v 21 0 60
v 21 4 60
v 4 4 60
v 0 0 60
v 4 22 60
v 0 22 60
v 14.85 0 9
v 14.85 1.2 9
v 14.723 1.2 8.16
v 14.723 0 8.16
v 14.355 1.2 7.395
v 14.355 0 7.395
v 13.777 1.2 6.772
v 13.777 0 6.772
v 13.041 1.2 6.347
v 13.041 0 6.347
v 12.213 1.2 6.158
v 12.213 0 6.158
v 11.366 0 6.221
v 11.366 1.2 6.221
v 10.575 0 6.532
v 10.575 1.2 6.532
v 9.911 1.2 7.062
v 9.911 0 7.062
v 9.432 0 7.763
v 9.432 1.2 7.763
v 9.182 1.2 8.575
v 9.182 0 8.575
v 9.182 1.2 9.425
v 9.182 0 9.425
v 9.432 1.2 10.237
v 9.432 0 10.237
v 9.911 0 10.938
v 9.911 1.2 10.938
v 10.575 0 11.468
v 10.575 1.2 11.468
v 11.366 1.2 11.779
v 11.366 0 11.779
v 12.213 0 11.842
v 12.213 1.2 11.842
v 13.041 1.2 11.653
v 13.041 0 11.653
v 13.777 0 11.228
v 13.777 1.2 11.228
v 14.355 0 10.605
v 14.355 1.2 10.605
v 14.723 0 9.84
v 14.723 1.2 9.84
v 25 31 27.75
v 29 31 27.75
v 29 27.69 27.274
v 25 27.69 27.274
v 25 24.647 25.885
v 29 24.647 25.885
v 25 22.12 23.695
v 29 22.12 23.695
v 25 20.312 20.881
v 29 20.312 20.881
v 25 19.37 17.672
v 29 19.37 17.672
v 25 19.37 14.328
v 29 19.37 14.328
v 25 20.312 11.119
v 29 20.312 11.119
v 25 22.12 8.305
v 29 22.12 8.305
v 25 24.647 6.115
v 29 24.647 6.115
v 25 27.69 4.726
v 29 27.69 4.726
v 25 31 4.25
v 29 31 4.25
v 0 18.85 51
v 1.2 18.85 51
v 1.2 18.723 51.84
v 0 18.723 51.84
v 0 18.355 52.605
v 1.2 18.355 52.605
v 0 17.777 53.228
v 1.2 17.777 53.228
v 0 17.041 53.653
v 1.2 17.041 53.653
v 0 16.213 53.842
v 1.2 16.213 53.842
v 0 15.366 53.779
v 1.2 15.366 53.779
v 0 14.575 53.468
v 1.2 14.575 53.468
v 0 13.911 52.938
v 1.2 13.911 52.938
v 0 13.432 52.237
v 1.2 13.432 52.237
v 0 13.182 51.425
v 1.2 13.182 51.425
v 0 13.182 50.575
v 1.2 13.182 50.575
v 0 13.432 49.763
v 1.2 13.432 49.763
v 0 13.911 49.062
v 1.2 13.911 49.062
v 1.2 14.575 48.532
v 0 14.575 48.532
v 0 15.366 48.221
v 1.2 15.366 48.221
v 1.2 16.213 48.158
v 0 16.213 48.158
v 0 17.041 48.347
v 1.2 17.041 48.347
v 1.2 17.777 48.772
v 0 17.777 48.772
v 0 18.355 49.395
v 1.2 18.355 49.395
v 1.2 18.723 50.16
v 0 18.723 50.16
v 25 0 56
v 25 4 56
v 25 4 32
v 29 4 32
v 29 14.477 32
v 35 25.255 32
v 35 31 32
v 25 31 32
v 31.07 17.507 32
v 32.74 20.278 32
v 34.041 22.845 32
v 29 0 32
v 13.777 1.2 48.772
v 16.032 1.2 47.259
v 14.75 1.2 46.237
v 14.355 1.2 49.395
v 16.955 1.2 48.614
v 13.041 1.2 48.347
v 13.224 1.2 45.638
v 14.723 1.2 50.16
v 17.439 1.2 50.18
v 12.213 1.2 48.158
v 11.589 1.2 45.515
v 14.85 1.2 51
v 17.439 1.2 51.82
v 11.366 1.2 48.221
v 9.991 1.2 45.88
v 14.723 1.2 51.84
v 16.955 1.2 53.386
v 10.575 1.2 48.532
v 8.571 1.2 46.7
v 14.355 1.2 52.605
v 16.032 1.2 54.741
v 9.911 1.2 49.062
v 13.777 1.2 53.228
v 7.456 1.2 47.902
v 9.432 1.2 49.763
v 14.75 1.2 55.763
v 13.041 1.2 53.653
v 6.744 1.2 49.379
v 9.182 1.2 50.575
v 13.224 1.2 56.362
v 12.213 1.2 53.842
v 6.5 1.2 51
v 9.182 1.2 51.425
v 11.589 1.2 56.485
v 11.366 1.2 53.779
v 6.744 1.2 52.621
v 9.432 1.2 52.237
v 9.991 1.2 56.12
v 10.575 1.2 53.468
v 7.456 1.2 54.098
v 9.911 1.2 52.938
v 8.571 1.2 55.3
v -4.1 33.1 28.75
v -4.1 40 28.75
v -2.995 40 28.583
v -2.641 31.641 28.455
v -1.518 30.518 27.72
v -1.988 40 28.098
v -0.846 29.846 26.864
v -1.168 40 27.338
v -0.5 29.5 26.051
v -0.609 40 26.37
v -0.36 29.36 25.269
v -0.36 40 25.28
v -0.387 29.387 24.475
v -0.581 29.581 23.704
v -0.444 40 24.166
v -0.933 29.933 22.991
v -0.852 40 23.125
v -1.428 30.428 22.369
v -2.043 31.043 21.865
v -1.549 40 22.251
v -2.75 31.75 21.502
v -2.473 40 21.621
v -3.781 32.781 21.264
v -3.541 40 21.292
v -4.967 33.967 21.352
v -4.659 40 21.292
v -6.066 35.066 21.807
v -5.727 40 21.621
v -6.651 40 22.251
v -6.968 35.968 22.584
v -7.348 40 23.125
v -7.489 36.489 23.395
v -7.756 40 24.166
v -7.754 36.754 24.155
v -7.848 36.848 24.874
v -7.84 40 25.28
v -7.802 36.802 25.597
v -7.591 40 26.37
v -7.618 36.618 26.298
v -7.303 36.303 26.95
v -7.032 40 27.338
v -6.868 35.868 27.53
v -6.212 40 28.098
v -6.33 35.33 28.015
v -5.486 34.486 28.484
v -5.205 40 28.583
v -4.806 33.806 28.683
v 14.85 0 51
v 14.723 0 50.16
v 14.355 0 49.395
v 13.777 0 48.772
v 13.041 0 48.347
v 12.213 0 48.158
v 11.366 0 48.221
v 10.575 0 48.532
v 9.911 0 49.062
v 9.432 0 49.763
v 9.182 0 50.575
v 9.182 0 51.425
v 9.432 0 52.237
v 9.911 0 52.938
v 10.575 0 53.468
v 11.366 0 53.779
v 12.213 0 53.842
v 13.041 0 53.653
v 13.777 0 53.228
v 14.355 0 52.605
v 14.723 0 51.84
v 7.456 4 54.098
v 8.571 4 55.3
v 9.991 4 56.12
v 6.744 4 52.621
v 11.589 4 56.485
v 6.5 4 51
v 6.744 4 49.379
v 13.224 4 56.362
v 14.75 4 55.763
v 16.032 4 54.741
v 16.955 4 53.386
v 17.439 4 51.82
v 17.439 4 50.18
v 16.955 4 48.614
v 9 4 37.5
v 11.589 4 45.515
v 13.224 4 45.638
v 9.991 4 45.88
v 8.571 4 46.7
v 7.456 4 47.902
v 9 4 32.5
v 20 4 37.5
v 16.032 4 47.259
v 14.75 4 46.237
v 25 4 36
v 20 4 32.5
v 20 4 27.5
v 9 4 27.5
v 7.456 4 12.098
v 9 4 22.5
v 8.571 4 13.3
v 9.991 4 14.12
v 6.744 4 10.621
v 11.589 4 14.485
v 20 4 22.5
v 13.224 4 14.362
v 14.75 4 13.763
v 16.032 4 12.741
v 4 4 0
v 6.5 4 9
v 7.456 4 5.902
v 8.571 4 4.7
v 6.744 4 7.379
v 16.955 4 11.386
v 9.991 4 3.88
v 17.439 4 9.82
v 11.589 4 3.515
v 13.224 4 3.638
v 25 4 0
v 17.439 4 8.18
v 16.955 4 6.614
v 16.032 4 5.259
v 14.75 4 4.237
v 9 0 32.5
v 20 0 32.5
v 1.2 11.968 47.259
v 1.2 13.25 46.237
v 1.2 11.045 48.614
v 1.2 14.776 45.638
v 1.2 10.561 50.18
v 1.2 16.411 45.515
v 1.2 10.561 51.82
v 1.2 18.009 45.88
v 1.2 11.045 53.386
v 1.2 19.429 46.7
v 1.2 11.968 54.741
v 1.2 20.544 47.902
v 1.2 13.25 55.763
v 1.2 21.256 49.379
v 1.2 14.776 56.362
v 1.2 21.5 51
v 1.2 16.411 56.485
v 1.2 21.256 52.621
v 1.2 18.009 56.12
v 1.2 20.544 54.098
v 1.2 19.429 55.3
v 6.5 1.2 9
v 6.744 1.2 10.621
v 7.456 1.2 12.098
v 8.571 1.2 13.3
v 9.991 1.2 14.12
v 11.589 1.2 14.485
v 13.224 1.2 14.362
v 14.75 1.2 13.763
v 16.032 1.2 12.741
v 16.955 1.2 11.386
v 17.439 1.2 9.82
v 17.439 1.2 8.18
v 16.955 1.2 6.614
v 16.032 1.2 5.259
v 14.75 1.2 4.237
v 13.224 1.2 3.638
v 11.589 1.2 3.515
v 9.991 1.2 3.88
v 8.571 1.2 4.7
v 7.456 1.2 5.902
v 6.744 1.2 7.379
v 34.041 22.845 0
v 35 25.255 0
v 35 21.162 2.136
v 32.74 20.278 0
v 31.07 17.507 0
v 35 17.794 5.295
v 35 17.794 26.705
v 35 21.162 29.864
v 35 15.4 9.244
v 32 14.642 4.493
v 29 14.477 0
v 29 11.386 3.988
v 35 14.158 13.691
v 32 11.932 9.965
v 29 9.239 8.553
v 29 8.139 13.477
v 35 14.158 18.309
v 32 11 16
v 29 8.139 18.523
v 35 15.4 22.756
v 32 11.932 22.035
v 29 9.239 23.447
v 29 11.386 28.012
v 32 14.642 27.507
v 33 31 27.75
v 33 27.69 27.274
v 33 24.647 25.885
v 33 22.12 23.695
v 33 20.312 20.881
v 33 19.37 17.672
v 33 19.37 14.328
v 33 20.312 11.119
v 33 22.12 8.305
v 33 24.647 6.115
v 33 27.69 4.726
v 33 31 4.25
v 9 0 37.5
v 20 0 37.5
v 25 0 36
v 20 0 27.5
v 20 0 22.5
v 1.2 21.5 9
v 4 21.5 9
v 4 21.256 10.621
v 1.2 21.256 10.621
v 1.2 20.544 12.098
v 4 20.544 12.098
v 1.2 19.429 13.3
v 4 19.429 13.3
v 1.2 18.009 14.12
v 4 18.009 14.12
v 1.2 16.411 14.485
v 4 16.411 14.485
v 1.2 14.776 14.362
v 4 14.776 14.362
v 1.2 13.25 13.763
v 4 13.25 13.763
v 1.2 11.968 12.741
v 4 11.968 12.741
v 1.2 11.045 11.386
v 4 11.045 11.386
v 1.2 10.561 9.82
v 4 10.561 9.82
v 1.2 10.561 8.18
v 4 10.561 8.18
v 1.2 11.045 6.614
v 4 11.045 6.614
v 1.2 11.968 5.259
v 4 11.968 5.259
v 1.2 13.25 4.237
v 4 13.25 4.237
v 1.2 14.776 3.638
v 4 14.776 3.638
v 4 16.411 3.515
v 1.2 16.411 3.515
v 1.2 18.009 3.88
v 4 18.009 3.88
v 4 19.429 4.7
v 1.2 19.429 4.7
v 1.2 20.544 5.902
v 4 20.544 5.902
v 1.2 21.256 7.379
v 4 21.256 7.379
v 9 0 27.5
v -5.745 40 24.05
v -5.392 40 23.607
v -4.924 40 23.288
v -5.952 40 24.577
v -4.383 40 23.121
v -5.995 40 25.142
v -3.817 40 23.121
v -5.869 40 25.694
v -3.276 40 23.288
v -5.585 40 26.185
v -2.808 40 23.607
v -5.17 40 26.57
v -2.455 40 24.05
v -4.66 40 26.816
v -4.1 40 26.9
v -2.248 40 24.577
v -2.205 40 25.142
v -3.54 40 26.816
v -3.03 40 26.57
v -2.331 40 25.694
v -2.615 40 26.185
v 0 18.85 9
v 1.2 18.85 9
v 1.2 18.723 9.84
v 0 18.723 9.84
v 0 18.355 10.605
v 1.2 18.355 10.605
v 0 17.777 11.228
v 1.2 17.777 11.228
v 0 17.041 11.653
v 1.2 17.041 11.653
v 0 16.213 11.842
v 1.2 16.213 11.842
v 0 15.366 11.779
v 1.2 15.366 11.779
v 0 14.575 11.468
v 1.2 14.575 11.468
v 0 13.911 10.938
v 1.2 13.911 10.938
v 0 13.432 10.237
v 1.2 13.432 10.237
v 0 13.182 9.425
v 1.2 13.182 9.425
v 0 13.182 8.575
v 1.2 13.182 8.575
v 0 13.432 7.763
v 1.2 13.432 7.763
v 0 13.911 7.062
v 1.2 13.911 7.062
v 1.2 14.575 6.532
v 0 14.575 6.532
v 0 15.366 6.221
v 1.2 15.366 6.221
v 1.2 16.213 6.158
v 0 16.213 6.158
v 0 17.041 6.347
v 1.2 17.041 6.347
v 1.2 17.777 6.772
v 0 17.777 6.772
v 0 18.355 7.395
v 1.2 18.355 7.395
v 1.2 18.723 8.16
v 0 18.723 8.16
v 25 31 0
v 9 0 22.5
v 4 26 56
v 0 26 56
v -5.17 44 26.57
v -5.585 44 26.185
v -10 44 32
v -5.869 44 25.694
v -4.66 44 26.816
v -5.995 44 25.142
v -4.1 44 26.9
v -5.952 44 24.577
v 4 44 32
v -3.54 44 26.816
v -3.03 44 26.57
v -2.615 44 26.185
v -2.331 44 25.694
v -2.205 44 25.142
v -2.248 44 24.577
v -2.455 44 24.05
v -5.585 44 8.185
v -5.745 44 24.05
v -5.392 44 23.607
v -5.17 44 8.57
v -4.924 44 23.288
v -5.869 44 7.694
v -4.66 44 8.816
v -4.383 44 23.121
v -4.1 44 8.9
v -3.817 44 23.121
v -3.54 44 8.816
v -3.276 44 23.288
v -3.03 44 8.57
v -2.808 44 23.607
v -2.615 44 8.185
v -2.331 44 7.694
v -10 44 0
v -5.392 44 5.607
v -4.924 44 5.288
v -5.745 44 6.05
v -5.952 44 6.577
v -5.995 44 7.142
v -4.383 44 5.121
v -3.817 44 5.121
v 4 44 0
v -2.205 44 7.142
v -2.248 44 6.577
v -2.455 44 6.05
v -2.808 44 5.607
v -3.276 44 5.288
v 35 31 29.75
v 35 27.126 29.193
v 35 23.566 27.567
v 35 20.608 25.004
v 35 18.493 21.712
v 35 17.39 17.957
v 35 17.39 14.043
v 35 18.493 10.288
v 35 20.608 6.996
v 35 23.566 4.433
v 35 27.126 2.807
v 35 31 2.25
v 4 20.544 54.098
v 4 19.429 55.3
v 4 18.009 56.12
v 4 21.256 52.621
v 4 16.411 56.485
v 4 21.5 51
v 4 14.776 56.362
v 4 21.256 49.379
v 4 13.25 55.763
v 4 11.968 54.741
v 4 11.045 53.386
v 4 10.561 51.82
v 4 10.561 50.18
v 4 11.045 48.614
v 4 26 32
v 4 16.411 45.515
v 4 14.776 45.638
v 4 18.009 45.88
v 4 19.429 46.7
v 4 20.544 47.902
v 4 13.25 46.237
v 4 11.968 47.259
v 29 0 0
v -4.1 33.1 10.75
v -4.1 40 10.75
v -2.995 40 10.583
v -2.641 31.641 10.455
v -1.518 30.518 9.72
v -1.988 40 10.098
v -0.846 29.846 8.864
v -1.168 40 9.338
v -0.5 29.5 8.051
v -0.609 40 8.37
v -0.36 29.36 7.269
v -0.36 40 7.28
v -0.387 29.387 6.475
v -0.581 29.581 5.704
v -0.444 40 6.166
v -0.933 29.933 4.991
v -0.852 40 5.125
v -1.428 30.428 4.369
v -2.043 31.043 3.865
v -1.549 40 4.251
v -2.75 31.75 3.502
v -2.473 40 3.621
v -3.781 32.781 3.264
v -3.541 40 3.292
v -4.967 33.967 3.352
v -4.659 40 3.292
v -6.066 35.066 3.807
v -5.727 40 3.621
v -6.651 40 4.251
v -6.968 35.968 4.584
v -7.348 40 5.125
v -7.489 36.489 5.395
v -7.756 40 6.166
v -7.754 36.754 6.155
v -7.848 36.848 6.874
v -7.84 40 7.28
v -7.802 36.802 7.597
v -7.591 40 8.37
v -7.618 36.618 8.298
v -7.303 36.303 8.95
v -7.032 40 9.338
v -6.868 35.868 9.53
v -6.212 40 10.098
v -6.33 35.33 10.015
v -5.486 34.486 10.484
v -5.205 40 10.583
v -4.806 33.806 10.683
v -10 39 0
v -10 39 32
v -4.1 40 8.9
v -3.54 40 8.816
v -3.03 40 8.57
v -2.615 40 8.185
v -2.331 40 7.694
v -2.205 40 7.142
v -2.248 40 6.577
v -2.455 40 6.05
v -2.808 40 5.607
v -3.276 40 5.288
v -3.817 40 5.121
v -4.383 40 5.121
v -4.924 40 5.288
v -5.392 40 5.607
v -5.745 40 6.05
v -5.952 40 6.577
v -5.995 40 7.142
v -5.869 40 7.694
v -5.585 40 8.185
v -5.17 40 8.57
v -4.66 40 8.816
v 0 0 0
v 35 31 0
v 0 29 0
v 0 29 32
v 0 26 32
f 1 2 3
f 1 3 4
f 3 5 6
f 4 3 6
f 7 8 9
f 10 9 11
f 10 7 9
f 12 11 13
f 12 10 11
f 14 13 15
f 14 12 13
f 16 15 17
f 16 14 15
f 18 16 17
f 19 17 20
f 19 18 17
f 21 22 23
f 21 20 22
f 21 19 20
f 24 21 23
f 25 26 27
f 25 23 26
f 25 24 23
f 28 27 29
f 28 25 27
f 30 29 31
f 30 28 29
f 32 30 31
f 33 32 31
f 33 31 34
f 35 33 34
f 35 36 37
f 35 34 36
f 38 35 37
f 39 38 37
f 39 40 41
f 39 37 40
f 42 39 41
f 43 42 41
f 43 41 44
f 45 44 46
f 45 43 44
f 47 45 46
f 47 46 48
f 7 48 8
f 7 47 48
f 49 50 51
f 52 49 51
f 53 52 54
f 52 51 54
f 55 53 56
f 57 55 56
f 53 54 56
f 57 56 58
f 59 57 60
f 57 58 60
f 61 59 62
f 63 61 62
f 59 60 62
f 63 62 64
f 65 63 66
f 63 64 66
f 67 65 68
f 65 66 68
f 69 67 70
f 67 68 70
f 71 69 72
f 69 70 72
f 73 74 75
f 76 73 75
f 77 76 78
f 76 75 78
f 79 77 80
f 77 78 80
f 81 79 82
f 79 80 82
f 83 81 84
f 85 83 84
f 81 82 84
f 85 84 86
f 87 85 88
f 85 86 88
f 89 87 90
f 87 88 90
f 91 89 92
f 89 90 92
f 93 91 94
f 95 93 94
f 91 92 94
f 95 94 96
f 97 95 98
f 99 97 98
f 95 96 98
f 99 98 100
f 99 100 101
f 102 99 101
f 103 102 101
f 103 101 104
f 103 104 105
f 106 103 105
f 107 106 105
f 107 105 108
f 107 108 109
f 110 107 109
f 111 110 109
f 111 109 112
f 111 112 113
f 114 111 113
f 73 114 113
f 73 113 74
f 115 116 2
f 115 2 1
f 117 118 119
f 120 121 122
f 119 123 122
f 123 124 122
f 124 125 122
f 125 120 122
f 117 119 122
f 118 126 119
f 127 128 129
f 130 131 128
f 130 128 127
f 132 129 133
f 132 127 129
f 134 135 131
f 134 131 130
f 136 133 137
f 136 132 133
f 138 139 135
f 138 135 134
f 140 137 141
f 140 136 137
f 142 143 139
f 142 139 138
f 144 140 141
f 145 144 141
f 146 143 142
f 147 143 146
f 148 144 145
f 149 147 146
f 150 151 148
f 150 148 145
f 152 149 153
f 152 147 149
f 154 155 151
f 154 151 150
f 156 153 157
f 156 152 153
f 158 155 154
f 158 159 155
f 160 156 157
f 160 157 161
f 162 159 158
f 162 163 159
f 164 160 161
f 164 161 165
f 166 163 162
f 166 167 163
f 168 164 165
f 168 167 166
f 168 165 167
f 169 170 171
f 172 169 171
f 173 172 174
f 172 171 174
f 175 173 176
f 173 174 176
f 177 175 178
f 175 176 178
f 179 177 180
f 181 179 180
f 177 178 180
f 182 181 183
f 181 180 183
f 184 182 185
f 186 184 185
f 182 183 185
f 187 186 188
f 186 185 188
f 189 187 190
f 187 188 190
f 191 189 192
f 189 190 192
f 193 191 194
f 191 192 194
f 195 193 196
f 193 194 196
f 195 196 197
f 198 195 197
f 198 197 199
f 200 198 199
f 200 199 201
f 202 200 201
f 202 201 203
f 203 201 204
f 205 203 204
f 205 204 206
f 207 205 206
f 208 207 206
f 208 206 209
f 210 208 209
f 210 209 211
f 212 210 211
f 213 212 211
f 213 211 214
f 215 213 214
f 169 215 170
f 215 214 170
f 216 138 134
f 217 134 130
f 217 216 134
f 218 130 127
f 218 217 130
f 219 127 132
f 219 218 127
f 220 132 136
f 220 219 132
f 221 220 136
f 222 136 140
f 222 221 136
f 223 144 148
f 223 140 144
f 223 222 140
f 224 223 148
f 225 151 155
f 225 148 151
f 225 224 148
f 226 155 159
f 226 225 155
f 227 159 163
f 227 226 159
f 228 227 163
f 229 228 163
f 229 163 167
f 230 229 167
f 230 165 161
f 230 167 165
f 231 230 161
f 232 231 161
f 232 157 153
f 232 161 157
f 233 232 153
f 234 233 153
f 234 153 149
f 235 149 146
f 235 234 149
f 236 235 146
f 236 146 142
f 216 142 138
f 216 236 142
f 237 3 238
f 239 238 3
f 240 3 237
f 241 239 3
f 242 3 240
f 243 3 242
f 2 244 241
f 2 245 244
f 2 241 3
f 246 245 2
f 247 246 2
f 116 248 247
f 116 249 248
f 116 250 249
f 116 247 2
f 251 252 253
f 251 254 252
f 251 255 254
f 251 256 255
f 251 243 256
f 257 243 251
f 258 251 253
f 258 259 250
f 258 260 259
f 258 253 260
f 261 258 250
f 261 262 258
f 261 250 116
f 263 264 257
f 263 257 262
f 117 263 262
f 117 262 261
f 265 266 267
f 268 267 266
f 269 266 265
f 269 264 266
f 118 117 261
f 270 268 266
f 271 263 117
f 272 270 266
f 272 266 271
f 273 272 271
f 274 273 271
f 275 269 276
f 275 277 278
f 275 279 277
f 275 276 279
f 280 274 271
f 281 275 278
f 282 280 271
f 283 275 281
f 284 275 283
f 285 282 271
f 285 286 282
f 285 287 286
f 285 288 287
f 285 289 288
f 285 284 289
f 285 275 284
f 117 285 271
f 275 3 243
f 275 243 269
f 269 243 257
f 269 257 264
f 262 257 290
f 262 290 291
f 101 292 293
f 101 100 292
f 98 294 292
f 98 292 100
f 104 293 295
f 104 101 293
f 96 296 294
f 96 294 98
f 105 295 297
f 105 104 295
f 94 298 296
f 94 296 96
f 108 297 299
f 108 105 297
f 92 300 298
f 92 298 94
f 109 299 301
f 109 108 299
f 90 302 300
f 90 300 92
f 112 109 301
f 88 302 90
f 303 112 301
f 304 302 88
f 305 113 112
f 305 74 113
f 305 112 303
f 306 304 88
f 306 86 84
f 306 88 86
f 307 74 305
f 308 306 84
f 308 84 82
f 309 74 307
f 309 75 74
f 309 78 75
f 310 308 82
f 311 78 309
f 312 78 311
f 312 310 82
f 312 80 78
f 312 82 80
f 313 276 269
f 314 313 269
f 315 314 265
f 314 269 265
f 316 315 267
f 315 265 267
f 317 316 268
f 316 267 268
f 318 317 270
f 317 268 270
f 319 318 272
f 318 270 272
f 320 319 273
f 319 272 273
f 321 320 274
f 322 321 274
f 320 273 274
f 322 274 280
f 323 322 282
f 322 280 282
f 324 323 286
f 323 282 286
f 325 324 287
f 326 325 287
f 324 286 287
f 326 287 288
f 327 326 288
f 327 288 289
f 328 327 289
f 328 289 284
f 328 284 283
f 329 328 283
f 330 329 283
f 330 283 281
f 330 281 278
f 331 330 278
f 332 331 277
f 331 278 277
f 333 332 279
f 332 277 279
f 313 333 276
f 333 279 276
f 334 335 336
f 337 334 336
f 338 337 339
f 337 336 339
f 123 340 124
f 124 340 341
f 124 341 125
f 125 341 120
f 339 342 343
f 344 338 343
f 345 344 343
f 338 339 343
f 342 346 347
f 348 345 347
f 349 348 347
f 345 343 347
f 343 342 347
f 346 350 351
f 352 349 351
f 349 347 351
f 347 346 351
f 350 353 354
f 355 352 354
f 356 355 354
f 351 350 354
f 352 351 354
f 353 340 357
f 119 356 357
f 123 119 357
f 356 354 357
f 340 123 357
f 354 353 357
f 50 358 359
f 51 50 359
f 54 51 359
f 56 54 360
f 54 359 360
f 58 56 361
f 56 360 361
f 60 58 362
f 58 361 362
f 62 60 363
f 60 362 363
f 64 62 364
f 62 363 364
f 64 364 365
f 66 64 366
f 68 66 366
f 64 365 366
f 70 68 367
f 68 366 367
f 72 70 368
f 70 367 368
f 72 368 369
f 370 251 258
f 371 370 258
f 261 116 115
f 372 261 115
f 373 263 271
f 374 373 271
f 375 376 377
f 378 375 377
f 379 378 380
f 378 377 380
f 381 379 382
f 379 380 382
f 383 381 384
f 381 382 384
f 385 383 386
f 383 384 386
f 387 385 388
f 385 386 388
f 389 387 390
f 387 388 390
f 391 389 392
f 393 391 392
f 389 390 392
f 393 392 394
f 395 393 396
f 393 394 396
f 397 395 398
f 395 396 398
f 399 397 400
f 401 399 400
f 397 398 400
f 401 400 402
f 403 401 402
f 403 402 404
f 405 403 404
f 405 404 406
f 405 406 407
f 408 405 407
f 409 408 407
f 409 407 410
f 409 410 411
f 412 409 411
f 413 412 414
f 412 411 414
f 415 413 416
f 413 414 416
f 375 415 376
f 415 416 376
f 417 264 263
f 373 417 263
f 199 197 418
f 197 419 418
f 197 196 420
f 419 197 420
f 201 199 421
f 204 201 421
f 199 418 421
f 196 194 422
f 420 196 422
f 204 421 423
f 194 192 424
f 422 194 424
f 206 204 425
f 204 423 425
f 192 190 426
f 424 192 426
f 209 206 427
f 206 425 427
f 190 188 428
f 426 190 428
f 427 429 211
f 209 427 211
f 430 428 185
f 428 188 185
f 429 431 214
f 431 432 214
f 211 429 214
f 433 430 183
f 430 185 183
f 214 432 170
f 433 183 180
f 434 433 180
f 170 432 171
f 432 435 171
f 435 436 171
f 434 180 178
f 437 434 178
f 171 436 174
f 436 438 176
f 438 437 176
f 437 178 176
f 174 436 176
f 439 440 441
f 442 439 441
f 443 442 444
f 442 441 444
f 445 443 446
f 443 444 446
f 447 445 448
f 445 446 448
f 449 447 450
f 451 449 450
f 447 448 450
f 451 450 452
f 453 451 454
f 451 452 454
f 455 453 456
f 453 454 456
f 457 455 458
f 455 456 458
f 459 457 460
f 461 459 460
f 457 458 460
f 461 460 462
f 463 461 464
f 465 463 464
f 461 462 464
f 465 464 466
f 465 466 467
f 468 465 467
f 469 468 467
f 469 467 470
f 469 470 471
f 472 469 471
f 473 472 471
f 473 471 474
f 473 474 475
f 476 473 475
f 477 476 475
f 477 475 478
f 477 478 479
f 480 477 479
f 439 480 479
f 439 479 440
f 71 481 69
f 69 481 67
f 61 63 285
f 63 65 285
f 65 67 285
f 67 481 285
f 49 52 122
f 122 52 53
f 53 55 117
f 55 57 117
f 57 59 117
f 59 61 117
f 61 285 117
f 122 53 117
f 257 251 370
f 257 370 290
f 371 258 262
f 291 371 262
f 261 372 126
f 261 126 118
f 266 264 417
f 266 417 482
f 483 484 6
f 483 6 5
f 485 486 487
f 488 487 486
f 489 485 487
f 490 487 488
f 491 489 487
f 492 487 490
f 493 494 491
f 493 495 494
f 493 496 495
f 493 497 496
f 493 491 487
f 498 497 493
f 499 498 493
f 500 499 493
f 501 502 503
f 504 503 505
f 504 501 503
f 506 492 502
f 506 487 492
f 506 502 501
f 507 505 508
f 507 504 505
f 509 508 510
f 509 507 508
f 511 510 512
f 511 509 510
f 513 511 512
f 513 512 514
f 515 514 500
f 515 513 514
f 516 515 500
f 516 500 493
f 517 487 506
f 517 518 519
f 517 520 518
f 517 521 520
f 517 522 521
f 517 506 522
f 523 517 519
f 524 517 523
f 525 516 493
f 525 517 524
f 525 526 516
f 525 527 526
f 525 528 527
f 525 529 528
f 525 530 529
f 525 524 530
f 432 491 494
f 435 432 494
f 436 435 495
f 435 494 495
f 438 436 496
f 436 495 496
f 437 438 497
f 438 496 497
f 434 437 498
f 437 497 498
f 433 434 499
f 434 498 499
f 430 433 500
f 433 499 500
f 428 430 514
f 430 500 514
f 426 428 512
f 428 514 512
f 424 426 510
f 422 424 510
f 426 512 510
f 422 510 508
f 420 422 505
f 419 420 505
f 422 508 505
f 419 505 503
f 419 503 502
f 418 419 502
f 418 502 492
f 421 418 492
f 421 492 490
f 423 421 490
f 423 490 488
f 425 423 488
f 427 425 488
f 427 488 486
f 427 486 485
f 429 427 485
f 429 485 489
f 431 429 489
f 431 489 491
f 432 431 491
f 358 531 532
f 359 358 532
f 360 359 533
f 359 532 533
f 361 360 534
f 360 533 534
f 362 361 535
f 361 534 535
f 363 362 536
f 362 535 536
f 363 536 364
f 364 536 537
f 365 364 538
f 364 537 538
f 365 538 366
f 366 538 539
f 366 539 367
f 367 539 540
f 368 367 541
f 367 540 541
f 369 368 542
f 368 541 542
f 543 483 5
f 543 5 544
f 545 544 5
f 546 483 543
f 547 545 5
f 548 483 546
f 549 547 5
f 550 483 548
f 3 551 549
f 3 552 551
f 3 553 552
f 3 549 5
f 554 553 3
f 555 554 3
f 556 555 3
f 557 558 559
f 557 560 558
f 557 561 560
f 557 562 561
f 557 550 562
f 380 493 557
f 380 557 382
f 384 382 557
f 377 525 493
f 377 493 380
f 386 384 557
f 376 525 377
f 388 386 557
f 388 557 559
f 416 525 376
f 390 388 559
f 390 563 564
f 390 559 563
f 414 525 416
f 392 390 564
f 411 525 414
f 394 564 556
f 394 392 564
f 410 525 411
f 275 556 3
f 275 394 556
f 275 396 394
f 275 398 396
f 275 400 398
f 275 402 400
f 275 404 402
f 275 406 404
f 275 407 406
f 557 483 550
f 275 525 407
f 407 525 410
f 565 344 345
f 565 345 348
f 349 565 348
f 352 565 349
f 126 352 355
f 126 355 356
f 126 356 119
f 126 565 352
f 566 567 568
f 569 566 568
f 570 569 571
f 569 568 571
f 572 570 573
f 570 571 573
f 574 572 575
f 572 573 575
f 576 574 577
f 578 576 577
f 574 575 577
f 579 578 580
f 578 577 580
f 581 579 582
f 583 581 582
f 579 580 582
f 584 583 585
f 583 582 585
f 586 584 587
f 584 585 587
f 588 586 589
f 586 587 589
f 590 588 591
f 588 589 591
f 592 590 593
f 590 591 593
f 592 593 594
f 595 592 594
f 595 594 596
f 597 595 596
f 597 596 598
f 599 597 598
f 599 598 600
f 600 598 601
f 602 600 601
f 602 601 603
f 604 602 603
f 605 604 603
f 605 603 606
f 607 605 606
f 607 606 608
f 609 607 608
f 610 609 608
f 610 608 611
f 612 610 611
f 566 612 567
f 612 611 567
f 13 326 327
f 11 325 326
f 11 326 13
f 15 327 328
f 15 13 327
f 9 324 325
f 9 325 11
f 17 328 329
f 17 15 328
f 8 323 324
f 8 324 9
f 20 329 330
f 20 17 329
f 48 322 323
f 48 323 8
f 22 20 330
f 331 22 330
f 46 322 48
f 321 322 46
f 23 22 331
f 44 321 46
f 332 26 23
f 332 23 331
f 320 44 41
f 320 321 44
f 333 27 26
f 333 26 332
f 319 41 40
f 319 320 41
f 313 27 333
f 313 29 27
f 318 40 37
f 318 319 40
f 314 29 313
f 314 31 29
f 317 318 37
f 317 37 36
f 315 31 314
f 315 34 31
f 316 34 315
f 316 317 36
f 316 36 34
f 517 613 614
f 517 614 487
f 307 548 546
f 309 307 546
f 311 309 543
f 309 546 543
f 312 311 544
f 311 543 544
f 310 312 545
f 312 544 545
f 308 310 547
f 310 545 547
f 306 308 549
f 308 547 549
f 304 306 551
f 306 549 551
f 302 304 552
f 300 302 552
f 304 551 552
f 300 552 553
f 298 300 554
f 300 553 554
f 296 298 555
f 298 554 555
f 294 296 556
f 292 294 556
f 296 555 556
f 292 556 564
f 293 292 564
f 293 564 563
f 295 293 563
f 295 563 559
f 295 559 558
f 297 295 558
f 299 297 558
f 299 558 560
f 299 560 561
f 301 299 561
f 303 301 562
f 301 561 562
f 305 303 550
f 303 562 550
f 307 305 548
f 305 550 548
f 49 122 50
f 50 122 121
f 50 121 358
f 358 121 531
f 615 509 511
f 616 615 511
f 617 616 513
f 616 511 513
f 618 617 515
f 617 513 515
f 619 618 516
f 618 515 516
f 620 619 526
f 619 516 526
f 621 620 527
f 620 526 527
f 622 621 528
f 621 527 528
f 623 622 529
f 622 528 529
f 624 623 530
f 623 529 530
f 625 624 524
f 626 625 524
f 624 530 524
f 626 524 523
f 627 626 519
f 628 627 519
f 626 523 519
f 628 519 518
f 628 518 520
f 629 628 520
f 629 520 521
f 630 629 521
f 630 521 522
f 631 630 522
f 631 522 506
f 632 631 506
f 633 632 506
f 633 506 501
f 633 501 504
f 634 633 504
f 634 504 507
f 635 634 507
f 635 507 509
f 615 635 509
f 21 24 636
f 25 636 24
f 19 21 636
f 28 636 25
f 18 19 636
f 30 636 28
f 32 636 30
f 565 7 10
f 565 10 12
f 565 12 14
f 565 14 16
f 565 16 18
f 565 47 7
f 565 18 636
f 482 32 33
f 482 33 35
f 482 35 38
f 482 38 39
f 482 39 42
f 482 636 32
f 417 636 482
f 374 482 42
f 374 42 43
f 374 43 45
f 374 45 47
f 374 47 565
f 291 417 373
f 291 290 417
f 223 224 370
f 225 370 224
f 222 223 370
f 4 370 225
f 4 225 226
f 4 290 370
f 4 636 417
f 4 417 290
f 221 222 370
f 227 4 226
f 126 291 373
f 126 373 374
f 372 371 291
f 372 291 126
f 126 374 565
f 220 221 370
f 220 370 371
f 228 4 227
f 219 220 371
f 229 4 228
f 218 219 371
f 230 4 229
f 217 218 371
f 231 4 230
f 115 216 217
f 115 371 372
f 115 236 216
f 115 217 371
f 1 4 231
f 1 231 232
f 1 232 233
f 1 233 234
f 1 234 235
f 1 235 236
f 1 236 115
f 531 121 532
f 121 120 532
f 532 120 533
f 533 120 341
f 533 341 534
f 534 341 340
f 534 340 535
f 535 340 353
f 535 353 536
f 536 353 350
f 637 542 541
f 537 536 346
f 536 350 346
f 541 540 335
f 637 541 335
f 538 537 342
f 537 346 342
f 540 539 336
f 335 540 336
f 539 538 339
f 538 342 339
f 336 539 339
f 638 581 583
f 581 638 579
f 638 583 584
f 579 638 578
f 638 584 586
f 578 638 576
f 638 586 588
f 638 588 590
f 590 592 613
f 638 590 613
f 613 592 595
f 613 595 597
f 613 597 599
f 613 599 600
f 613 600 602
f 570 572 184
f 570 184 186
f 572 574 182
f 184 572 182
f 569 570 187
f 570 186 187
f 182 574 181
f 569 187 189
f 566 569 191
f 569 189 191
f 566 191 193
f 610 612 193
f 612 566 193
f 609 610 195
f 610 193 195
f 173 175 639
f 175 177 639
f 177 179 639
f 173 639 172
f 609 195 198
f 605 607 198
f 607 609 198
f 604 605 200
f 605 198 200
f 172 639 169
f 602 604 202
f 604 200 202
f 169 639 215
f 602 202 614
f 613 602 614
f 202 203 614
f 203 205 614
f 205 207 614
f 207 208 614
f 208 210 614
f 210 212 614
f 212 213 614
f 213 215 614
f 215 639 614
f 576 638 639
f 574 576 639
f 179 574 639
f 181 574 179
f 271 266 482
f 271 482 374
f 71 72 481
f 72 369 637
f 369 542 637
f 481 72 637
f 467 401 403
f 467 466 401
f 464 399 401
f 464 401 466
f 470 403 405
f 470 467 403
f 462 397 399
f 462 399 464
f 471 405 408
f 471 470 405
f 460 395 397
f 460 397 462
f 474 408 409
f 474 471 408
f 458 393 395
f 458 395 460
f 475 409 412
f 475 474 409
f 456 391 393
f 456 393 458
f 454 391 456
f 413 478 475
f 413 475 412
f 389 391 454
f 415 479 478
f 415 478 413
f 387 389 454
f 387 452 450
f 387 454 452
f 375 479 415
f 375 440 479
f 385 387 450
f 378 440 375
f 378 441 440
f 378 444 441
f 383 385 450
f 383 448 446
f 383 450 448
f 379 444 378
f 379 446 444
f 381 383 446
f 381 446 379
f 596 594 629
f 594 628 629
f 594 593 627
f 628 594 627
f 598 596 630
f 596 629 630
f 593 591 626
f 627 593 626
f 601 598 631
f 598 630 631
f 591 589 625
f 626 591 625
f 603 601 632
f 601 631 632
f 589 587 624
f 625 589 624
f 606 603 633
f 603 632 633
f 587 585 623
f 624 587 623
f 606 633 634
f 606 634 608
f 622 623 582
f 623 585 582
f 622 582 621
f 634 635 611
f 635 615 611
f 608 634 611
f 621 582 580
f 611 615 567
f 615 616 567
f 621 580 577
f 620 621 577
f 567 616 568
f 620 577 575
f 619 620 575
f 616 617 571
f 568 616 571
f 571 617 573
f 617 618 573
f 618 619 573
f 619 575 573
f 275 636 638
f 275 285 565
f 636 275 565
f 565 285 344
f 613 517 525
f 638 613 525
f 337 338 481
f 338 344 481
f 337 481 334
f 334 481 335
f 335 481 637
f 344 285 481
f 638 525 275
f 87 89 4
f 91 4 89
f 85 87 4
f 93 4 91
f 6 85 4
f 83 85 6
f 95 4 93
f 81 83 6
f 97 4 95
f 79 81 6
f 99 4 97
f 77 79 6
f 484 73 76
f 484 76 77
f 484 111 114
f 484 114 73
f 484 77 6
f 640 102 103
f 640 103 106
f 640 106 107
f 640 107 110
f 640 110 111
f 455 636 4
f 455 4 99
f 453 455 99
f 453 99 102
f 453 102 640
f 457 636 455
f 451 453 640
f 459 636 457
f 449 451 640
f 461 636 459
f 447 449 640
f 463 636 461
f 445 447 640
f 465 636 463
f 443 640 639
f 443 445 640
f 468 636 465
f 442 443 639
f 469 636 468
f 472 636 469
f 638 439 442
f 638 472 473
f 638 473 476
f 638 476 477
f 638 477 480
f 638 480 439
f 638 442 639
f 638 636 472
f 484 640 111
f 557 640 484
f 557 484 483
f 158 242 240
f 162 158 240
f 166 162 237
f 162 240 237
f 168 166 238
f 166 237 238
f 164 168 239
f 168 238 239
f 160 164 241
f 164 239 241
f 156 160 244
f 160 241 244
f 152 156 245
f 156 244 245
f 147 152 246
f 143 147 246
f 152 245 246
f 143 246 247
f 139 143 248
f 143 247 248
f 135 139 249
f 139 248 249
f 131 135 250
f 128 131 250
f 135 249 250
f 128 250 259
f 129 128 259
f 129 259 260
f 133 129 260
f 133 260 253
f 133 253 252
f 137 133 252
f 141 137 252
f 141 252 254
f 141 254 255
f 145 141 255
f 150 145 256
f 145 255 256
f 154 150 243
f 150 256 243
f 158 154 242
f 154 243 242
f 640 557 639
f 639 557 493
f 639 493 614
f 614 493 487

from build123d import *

# Parameters (mm, degrees)
BOSS_EXTRU_1_DEPTH          = 60
ENL_V_START                 = -4
ENL_V_MAT_EXTRU_1_OUTLINE_R = 2.85
ENL_V_MAT_EXTRU_1_DEPTH     = 4
ESQUISSE3_R                 = 5.5
ENL_V_MAT_EXTRU_2_DEPTH     = 2.8
ESQUISSE4_R                 = 2.85
ENL_V_MAT_EXTRU_3_DEPTH     = 20
ESQUISSE5_R                 = 5.5
ENL_V_MAT_EXTRU_4_DEPTH     = 2.8
ESQUISSE6_W                 = 4
ESQUISSE6_H                 = 32
BOSS_EXTRU_2_DEPTH          = 31
CHANFREIN1_SIZE             = 4
ESQUISSE7_R                 = 11.75
ENL_V_MAT_EXTRU_5_DEPTH     = 4
ESQUISSE9_W                 = 4
ESQUISSE9_H                 = 28
ENL_V_MAT_EXTRU_6_DEPTH     = 20
BOSS_EXTRU_4_DEPTH          = 32
ENL_V_MAT_EXTRU_7_REACH     = 82.975
ESQUISSE11_R                = 1.9
ENL_V_START_2               = -6
ESQUISSE12_R                = 3.75
ENL_V_MAT_EXTRU_8_DEPTH     = 20
CHANFREIN2_SIZE             = 4
ESQUISSE13_W                = 14
ESQUISSE13_H                = 32
ENL_V_MAT_EXTRU_9_DEPTH     = 2
BOSS_EXTRU_5_START          = 6
BOSS_EXTRU_5_DEPTH          = 6
CHANFREIN3_SIZE             = 7
CHANFREIN4_SIZE             = 2
ESQUISSE15_W                = 11
ESQUISSE15_H                = 5
ENL_V_MAT_EXTRU_10_DEPTH    = 10


# Read off the part's stored shape, not the designer's step: Enlèv. mat.-Extru.1
# Some blends are built 0.0001 mm under size
with BuildPart() as part:
    # Esquisse1 → Boss.-Extru.1 (new body)
    with BuildSketch(Plane.XY):
        Polygon((0, 0), (0, 46), (4, 46), (4, 4), (25, 4), (25, 0), align=None)
    extrude(amount=BOSS_EXTRU_1_DEPTH)

    # Enlèv. mat.-Extru.1 outline → Enlèv. mat.-Extru.1 (cut)
    with BuildSketch(Plane(origin=(0, 4, 0), x_dir=(1, 0, 0), z_dir=(0, 1, 0)).offset(ENL_V_START)):
        with Locations((12, -9)):
            Circle(ENL_V_MAT_EXTRU_1_OUTLINE_R)
        with Locations((12, -51)):
            Circle(ENL_V_MAT_EXTRU_1_OUTLINE_R)
    extrude(amount=ENL_V_MAT_EXTRU_1_DEPTH, mode=Mode.SUBTRACT)

    # Esquisse3 → Enlèv. mat.-Extru.2 (cut)
    with BuildSketch(Plane(origin=(0, 4, 0), x_dir=(1, 0, 0), z_dir=(0, 1, 0))):
        with Locations(Location((12, -9, 0), (0, 0, 180))):
            Circle(ESQUISSE3_R)
        with Locations(Location((12, -51, 0), (0, 0, 180))):
            Circle(ESQUISSE3_R)
    extrude(amount=-ENL_V_MAT_EXTRU_2_DEPTH, mode=Mode.SUBTRACT)

    # Esquisse4 → Enlèv. mat.-Extru.3 (cut)
    with BuildSketch(Plane(origin=(4, 0, 0), x_dir=(0, 0, -1), z_dir=(1, 0, 0))):
        with Locations(Location((-51, 16, 0), (0, 0, 90))):
            Circle(ESQUISSE4_R)
        with Locations(Location((-9, 16, 0), (0, 0, 90))):
            Circle(ESQUISSE4_R)
    extrude(amount=-ENL_V_MAT_EXTRU_3_DEPTH, mode=Mode.SUBTRACT)

    # Esquisse5 → Enlèv. mat.-Extru.4 (cut)
    with BuildSketch(Plane(origin=(4, 0, 0), x_dir=(0, 0, -1), z_dir=(1, 0, 0))):
        with Locations(Location((-51, 16, 0), (0, 0, 90))):
            Circle(ESQUISSE5_R)
        with Locations(Location((-9, 16, 0), (0, 0, 90))):
            Circle(ESQUISSE5_R)
    extrude(amount=-ENL_V_MAT_EXTRU_4_DEPTH, mode=Mode.SUBTRACT)

    # Esquisse6 → Boss.-Extru.2 (add)
    with BuildSketch(Plane.XZ):
        with Locations((27, 16)):
            Rectangle(ESQUISSE6_W, ESQUISSE6_H)
    extrude(amount=-BOSS_EXTRU_2_DEPTH)

    # Chanfrein1
    chanfrein1_edges = [part.edges().sort_by_distance(p)[0] for p in [
        (25, 2, 32),
    ]]
    chamfer(chanfrein1_edges, length=CHANFREIN1_SIZE - 0.0001)  # a hair under: the kernel refuses the full size

    # Esquisse7 → Enlèv. mat.-Extru.5 (cut)
    with BuildSketch(Plane(origin=(29, 0, 0), x_dir=(0, 0, -1), z_dir=(1, 0, 0))):
        with Locations((-16, 31)):
            Circle(ESQUISSE7_R)
    extrude(amount=-ENL_V_MAT_EXTRU_5_DEPTH, mode=Mode.SUBTRACT)

    # Esquisse9 → Enlèv. mat.-Extru.6 (cut)
    with BuildSketch(Plane(origin=(0, 46, 0), x_dir=(1, 0, 0), z_dir=(0, 1, 0))):
        with Locations((2, -46)):
            Rectangle(ESQUISSE9_W, ESQUISSE9_H)
    extrude(amount=-ENL_V_MAT_EXTRU_6_DEPTH, mode=Mode.SUBTRACT)

    # Esquisse10 → Boss.-Extru.4 (add)
    with BuildSketch(Plane.XY.offset(32)):
        Polygon((0, 29), (-10, 39), (-10, 46), (0, 46), (4, 46), (4, 26), (0, 26), align=None)
    extrude(amount=-BOSS_EXTRU_4_DEPTH)

    # Enlèv. mat.-Extru.7: up to this plane
    enl_v_mat_extru_7_end = Plane(origin=(0, 29, 0), z_dir=(-0.7071067811865436, -0.7071067811865517, 0))
    # Esquisse11 → Enlèv. mat.-Extru.7 (cut, up to the surface)
    with BuildSketch(Plane(origin=(0, 46, 0), x_dir=(1, 0, 0), z_dir=(0, 1, 0)), mode=Mode.PRIVATE) as enl_v_mat_extru_7_sk1:
        with Locations(Location((-4.1, -7, 0), (0, 0, 270))):
            Circle(ESQUISSE11_R)
    enl_v_mat_extru_7_tool1 = split(extrude(enl_v_mat_extru_7_sk1.sketch, amount=-ENL_V_MAT_EXTRU_7_REACH, mode=Mode.PRIVATE), bisect_by=enl_v_mat_extru_7_end, keep=Keep.BOTH, mode=Mode.PRIVATE)
    add(enl_v_mat_extru_7_tool1.solids().sort_by_distance((-4.1, 46, 7))[0], mode=Mode.SUBTRACT)
    # Esquisse11 → Enlèv. mat.-Extru.7 (cut, up to the surface)
    with BuildSketch(Plane(origin=(0, 46, 0), x_dir=(1, 0, 0), z_dir=(0, 1, 0)), mode=Mode.PRIVATE) as enl_v_mat_extru_7_sk2:
        with Locations(Location((-4.1, -25, 0), (0, 0, 270))):
            Circle(ESQUISSE11_R)
    enl_v_mat_extru_7_tool2 = split(extrude(enl_v_mat_extru_7_sk2.sketch, amount=-ENL_V_MAT_EXTRU_7_REACH, mode=Mode.PRIVATE), bisect_by=enl_v_mat_extru_7_end, keep=Keep.BOTH, mode=Mode.PRIVATE)
    add(enl_v_mat_extru_7_tool2.solids().sort_by_distance((-4.1, 46, 25))[0], mode=Mode.SUBTRACT)

    # Esquisse12 → Enlèv. mat.-Extru.8 (cut)
    with BuildSketch(Plane(origin=(0, 46, 0), x_dir=(1, 0, 0), z_dir=(0, 1, 0)).offset(ENL_V_START_2)):
        with Locations(Location((-4.1, -7, 0), (0, 0, 270))):
            Circle(ESQUISSE12_R)
        with Locations(Location((-4.1, -25, 0), (0, 0, 270))):
            Circle(ESQUISSE12_R)
    extrude(amount=-ENL_V_MAT_EXTRU_8_DEPTH, mode=Mode.SUBTRACT)

    # Chanfrein2
    chanfrein2_edges = [part.edges().sort_by_distance(p)[0] for p in [
        (2, 26, 60),
        (25, 2, 60),
    ]]
    chamfer(chanfrein2_edges, length=CHANFREIN2_SIZE)

    # Esquisse13 → Enlèv. mat.-Extru.9 (cut)
    with BuildSketch(Plane(origin=(0, 46, 0), x_dir=(1, 0, 0), z_dir=(0, 1, 0))):
        with Locations((-3, -16)):
            Rectangle(ESQUISSE13_W, ESQUISSE13_H)
    extrude(amount=-ENL_V_MAT_EXTRU_9_DEPTH, mode=Mode.SUBTRACT)

    # Esquisse14 → Boss.-Extru.5 (add)
    with BuildSketch(Plane(origin=(29, 0, 0), x_dir=(0, 0, -1), z_dir=(1, 0, 0)).offset(BOSS_EXTRU_5_START)):
        with BuildLine():
            Line((-32, 31), (-27.75, 31))
            ThreePointArc((-27.75, 31), (-16, 19.25), (-4.25, 31))
            Line((-4.25, 31), (0, 31))
            ThreePointArc((0, 31), (-16, 15), (-32, 31))
        make_face()
    extrude(amount=-BOSS_EXTRU_5_DEPTH)

    # Chanfrein3
    # the kernel refuses this chamfer: 7 mm, written as the material it adds along each edge
    with BuildSketch(Plane(origin=(29, 31, 16), x_dir=(0, 0, -1), z_dir=(0, 1, 0))) as chanfrein3_piece_1_section:
        Polygon((16 + CHANFREIN3_SIZE, 0), (16, -CHANFREIN3_SIZE), (16, 0), align=None)
    chanfrein3_piece_1 = revolve(axis=Axis((29, 31, 16), (-1, 0, 0)), revolution_arc=180, mode=Mode.PRIVATE)
    chanfrein3_piece_1 = split(chanfrein3_piece_1, bisect_by=Plane(origin=(32, 14.901456645, 32), z_dir=(0, 0, -1)), keep=Keep.TOP, mode=Mode.PRIVATE)
    chanfrein3_piece_1 = split(chanfrein3_piece_1, bisect_by=Plane(origin=(32, 14.901456645, 0), z_dir=(0, 0, 1)), keep=Keep.TOP, mode=Mode.PRIVATE)
    chanfrein3_piece_1 = split(chanfrein3_piece_1, bisect_by=Plane(origin=(35, 14.901456645, 16), z_dir=(-1, 0, 0)), keep=Keep.TOP, mode=Mode.PRIVATE)
    add(chanfrein3_piece_1)

    # Chanfrein4
    chanfrein4_edges = [part.edges().sort_by_distance(p)[0] for p in [
        (35, 19.25, 16),
    ]]
    chamfer(chanfrein4_edges, length=CHANFREIN4_SIZE)

    # Esquisse15 → Enlèv. mat.-Extru.10 (cut)
    with BuildSketch(Plane(origin=(0, 4, 0), x_dir=(1, 0, 0), z_dir=(0, 1, 0))):
        with Locations((14.5, -25)):
            Rectangle(ESQUISSE15_W, ESQUISSE15_H)
        with Locations((14.5, -35)):
            Rectangle(ESQUISSE15_W, ESQUISSE15_H)
    extrude(amount=-ENL_V_MAT_EXTRU_10_DEPTH, mode=Mode.SUBTRACT)


solid = part.part
